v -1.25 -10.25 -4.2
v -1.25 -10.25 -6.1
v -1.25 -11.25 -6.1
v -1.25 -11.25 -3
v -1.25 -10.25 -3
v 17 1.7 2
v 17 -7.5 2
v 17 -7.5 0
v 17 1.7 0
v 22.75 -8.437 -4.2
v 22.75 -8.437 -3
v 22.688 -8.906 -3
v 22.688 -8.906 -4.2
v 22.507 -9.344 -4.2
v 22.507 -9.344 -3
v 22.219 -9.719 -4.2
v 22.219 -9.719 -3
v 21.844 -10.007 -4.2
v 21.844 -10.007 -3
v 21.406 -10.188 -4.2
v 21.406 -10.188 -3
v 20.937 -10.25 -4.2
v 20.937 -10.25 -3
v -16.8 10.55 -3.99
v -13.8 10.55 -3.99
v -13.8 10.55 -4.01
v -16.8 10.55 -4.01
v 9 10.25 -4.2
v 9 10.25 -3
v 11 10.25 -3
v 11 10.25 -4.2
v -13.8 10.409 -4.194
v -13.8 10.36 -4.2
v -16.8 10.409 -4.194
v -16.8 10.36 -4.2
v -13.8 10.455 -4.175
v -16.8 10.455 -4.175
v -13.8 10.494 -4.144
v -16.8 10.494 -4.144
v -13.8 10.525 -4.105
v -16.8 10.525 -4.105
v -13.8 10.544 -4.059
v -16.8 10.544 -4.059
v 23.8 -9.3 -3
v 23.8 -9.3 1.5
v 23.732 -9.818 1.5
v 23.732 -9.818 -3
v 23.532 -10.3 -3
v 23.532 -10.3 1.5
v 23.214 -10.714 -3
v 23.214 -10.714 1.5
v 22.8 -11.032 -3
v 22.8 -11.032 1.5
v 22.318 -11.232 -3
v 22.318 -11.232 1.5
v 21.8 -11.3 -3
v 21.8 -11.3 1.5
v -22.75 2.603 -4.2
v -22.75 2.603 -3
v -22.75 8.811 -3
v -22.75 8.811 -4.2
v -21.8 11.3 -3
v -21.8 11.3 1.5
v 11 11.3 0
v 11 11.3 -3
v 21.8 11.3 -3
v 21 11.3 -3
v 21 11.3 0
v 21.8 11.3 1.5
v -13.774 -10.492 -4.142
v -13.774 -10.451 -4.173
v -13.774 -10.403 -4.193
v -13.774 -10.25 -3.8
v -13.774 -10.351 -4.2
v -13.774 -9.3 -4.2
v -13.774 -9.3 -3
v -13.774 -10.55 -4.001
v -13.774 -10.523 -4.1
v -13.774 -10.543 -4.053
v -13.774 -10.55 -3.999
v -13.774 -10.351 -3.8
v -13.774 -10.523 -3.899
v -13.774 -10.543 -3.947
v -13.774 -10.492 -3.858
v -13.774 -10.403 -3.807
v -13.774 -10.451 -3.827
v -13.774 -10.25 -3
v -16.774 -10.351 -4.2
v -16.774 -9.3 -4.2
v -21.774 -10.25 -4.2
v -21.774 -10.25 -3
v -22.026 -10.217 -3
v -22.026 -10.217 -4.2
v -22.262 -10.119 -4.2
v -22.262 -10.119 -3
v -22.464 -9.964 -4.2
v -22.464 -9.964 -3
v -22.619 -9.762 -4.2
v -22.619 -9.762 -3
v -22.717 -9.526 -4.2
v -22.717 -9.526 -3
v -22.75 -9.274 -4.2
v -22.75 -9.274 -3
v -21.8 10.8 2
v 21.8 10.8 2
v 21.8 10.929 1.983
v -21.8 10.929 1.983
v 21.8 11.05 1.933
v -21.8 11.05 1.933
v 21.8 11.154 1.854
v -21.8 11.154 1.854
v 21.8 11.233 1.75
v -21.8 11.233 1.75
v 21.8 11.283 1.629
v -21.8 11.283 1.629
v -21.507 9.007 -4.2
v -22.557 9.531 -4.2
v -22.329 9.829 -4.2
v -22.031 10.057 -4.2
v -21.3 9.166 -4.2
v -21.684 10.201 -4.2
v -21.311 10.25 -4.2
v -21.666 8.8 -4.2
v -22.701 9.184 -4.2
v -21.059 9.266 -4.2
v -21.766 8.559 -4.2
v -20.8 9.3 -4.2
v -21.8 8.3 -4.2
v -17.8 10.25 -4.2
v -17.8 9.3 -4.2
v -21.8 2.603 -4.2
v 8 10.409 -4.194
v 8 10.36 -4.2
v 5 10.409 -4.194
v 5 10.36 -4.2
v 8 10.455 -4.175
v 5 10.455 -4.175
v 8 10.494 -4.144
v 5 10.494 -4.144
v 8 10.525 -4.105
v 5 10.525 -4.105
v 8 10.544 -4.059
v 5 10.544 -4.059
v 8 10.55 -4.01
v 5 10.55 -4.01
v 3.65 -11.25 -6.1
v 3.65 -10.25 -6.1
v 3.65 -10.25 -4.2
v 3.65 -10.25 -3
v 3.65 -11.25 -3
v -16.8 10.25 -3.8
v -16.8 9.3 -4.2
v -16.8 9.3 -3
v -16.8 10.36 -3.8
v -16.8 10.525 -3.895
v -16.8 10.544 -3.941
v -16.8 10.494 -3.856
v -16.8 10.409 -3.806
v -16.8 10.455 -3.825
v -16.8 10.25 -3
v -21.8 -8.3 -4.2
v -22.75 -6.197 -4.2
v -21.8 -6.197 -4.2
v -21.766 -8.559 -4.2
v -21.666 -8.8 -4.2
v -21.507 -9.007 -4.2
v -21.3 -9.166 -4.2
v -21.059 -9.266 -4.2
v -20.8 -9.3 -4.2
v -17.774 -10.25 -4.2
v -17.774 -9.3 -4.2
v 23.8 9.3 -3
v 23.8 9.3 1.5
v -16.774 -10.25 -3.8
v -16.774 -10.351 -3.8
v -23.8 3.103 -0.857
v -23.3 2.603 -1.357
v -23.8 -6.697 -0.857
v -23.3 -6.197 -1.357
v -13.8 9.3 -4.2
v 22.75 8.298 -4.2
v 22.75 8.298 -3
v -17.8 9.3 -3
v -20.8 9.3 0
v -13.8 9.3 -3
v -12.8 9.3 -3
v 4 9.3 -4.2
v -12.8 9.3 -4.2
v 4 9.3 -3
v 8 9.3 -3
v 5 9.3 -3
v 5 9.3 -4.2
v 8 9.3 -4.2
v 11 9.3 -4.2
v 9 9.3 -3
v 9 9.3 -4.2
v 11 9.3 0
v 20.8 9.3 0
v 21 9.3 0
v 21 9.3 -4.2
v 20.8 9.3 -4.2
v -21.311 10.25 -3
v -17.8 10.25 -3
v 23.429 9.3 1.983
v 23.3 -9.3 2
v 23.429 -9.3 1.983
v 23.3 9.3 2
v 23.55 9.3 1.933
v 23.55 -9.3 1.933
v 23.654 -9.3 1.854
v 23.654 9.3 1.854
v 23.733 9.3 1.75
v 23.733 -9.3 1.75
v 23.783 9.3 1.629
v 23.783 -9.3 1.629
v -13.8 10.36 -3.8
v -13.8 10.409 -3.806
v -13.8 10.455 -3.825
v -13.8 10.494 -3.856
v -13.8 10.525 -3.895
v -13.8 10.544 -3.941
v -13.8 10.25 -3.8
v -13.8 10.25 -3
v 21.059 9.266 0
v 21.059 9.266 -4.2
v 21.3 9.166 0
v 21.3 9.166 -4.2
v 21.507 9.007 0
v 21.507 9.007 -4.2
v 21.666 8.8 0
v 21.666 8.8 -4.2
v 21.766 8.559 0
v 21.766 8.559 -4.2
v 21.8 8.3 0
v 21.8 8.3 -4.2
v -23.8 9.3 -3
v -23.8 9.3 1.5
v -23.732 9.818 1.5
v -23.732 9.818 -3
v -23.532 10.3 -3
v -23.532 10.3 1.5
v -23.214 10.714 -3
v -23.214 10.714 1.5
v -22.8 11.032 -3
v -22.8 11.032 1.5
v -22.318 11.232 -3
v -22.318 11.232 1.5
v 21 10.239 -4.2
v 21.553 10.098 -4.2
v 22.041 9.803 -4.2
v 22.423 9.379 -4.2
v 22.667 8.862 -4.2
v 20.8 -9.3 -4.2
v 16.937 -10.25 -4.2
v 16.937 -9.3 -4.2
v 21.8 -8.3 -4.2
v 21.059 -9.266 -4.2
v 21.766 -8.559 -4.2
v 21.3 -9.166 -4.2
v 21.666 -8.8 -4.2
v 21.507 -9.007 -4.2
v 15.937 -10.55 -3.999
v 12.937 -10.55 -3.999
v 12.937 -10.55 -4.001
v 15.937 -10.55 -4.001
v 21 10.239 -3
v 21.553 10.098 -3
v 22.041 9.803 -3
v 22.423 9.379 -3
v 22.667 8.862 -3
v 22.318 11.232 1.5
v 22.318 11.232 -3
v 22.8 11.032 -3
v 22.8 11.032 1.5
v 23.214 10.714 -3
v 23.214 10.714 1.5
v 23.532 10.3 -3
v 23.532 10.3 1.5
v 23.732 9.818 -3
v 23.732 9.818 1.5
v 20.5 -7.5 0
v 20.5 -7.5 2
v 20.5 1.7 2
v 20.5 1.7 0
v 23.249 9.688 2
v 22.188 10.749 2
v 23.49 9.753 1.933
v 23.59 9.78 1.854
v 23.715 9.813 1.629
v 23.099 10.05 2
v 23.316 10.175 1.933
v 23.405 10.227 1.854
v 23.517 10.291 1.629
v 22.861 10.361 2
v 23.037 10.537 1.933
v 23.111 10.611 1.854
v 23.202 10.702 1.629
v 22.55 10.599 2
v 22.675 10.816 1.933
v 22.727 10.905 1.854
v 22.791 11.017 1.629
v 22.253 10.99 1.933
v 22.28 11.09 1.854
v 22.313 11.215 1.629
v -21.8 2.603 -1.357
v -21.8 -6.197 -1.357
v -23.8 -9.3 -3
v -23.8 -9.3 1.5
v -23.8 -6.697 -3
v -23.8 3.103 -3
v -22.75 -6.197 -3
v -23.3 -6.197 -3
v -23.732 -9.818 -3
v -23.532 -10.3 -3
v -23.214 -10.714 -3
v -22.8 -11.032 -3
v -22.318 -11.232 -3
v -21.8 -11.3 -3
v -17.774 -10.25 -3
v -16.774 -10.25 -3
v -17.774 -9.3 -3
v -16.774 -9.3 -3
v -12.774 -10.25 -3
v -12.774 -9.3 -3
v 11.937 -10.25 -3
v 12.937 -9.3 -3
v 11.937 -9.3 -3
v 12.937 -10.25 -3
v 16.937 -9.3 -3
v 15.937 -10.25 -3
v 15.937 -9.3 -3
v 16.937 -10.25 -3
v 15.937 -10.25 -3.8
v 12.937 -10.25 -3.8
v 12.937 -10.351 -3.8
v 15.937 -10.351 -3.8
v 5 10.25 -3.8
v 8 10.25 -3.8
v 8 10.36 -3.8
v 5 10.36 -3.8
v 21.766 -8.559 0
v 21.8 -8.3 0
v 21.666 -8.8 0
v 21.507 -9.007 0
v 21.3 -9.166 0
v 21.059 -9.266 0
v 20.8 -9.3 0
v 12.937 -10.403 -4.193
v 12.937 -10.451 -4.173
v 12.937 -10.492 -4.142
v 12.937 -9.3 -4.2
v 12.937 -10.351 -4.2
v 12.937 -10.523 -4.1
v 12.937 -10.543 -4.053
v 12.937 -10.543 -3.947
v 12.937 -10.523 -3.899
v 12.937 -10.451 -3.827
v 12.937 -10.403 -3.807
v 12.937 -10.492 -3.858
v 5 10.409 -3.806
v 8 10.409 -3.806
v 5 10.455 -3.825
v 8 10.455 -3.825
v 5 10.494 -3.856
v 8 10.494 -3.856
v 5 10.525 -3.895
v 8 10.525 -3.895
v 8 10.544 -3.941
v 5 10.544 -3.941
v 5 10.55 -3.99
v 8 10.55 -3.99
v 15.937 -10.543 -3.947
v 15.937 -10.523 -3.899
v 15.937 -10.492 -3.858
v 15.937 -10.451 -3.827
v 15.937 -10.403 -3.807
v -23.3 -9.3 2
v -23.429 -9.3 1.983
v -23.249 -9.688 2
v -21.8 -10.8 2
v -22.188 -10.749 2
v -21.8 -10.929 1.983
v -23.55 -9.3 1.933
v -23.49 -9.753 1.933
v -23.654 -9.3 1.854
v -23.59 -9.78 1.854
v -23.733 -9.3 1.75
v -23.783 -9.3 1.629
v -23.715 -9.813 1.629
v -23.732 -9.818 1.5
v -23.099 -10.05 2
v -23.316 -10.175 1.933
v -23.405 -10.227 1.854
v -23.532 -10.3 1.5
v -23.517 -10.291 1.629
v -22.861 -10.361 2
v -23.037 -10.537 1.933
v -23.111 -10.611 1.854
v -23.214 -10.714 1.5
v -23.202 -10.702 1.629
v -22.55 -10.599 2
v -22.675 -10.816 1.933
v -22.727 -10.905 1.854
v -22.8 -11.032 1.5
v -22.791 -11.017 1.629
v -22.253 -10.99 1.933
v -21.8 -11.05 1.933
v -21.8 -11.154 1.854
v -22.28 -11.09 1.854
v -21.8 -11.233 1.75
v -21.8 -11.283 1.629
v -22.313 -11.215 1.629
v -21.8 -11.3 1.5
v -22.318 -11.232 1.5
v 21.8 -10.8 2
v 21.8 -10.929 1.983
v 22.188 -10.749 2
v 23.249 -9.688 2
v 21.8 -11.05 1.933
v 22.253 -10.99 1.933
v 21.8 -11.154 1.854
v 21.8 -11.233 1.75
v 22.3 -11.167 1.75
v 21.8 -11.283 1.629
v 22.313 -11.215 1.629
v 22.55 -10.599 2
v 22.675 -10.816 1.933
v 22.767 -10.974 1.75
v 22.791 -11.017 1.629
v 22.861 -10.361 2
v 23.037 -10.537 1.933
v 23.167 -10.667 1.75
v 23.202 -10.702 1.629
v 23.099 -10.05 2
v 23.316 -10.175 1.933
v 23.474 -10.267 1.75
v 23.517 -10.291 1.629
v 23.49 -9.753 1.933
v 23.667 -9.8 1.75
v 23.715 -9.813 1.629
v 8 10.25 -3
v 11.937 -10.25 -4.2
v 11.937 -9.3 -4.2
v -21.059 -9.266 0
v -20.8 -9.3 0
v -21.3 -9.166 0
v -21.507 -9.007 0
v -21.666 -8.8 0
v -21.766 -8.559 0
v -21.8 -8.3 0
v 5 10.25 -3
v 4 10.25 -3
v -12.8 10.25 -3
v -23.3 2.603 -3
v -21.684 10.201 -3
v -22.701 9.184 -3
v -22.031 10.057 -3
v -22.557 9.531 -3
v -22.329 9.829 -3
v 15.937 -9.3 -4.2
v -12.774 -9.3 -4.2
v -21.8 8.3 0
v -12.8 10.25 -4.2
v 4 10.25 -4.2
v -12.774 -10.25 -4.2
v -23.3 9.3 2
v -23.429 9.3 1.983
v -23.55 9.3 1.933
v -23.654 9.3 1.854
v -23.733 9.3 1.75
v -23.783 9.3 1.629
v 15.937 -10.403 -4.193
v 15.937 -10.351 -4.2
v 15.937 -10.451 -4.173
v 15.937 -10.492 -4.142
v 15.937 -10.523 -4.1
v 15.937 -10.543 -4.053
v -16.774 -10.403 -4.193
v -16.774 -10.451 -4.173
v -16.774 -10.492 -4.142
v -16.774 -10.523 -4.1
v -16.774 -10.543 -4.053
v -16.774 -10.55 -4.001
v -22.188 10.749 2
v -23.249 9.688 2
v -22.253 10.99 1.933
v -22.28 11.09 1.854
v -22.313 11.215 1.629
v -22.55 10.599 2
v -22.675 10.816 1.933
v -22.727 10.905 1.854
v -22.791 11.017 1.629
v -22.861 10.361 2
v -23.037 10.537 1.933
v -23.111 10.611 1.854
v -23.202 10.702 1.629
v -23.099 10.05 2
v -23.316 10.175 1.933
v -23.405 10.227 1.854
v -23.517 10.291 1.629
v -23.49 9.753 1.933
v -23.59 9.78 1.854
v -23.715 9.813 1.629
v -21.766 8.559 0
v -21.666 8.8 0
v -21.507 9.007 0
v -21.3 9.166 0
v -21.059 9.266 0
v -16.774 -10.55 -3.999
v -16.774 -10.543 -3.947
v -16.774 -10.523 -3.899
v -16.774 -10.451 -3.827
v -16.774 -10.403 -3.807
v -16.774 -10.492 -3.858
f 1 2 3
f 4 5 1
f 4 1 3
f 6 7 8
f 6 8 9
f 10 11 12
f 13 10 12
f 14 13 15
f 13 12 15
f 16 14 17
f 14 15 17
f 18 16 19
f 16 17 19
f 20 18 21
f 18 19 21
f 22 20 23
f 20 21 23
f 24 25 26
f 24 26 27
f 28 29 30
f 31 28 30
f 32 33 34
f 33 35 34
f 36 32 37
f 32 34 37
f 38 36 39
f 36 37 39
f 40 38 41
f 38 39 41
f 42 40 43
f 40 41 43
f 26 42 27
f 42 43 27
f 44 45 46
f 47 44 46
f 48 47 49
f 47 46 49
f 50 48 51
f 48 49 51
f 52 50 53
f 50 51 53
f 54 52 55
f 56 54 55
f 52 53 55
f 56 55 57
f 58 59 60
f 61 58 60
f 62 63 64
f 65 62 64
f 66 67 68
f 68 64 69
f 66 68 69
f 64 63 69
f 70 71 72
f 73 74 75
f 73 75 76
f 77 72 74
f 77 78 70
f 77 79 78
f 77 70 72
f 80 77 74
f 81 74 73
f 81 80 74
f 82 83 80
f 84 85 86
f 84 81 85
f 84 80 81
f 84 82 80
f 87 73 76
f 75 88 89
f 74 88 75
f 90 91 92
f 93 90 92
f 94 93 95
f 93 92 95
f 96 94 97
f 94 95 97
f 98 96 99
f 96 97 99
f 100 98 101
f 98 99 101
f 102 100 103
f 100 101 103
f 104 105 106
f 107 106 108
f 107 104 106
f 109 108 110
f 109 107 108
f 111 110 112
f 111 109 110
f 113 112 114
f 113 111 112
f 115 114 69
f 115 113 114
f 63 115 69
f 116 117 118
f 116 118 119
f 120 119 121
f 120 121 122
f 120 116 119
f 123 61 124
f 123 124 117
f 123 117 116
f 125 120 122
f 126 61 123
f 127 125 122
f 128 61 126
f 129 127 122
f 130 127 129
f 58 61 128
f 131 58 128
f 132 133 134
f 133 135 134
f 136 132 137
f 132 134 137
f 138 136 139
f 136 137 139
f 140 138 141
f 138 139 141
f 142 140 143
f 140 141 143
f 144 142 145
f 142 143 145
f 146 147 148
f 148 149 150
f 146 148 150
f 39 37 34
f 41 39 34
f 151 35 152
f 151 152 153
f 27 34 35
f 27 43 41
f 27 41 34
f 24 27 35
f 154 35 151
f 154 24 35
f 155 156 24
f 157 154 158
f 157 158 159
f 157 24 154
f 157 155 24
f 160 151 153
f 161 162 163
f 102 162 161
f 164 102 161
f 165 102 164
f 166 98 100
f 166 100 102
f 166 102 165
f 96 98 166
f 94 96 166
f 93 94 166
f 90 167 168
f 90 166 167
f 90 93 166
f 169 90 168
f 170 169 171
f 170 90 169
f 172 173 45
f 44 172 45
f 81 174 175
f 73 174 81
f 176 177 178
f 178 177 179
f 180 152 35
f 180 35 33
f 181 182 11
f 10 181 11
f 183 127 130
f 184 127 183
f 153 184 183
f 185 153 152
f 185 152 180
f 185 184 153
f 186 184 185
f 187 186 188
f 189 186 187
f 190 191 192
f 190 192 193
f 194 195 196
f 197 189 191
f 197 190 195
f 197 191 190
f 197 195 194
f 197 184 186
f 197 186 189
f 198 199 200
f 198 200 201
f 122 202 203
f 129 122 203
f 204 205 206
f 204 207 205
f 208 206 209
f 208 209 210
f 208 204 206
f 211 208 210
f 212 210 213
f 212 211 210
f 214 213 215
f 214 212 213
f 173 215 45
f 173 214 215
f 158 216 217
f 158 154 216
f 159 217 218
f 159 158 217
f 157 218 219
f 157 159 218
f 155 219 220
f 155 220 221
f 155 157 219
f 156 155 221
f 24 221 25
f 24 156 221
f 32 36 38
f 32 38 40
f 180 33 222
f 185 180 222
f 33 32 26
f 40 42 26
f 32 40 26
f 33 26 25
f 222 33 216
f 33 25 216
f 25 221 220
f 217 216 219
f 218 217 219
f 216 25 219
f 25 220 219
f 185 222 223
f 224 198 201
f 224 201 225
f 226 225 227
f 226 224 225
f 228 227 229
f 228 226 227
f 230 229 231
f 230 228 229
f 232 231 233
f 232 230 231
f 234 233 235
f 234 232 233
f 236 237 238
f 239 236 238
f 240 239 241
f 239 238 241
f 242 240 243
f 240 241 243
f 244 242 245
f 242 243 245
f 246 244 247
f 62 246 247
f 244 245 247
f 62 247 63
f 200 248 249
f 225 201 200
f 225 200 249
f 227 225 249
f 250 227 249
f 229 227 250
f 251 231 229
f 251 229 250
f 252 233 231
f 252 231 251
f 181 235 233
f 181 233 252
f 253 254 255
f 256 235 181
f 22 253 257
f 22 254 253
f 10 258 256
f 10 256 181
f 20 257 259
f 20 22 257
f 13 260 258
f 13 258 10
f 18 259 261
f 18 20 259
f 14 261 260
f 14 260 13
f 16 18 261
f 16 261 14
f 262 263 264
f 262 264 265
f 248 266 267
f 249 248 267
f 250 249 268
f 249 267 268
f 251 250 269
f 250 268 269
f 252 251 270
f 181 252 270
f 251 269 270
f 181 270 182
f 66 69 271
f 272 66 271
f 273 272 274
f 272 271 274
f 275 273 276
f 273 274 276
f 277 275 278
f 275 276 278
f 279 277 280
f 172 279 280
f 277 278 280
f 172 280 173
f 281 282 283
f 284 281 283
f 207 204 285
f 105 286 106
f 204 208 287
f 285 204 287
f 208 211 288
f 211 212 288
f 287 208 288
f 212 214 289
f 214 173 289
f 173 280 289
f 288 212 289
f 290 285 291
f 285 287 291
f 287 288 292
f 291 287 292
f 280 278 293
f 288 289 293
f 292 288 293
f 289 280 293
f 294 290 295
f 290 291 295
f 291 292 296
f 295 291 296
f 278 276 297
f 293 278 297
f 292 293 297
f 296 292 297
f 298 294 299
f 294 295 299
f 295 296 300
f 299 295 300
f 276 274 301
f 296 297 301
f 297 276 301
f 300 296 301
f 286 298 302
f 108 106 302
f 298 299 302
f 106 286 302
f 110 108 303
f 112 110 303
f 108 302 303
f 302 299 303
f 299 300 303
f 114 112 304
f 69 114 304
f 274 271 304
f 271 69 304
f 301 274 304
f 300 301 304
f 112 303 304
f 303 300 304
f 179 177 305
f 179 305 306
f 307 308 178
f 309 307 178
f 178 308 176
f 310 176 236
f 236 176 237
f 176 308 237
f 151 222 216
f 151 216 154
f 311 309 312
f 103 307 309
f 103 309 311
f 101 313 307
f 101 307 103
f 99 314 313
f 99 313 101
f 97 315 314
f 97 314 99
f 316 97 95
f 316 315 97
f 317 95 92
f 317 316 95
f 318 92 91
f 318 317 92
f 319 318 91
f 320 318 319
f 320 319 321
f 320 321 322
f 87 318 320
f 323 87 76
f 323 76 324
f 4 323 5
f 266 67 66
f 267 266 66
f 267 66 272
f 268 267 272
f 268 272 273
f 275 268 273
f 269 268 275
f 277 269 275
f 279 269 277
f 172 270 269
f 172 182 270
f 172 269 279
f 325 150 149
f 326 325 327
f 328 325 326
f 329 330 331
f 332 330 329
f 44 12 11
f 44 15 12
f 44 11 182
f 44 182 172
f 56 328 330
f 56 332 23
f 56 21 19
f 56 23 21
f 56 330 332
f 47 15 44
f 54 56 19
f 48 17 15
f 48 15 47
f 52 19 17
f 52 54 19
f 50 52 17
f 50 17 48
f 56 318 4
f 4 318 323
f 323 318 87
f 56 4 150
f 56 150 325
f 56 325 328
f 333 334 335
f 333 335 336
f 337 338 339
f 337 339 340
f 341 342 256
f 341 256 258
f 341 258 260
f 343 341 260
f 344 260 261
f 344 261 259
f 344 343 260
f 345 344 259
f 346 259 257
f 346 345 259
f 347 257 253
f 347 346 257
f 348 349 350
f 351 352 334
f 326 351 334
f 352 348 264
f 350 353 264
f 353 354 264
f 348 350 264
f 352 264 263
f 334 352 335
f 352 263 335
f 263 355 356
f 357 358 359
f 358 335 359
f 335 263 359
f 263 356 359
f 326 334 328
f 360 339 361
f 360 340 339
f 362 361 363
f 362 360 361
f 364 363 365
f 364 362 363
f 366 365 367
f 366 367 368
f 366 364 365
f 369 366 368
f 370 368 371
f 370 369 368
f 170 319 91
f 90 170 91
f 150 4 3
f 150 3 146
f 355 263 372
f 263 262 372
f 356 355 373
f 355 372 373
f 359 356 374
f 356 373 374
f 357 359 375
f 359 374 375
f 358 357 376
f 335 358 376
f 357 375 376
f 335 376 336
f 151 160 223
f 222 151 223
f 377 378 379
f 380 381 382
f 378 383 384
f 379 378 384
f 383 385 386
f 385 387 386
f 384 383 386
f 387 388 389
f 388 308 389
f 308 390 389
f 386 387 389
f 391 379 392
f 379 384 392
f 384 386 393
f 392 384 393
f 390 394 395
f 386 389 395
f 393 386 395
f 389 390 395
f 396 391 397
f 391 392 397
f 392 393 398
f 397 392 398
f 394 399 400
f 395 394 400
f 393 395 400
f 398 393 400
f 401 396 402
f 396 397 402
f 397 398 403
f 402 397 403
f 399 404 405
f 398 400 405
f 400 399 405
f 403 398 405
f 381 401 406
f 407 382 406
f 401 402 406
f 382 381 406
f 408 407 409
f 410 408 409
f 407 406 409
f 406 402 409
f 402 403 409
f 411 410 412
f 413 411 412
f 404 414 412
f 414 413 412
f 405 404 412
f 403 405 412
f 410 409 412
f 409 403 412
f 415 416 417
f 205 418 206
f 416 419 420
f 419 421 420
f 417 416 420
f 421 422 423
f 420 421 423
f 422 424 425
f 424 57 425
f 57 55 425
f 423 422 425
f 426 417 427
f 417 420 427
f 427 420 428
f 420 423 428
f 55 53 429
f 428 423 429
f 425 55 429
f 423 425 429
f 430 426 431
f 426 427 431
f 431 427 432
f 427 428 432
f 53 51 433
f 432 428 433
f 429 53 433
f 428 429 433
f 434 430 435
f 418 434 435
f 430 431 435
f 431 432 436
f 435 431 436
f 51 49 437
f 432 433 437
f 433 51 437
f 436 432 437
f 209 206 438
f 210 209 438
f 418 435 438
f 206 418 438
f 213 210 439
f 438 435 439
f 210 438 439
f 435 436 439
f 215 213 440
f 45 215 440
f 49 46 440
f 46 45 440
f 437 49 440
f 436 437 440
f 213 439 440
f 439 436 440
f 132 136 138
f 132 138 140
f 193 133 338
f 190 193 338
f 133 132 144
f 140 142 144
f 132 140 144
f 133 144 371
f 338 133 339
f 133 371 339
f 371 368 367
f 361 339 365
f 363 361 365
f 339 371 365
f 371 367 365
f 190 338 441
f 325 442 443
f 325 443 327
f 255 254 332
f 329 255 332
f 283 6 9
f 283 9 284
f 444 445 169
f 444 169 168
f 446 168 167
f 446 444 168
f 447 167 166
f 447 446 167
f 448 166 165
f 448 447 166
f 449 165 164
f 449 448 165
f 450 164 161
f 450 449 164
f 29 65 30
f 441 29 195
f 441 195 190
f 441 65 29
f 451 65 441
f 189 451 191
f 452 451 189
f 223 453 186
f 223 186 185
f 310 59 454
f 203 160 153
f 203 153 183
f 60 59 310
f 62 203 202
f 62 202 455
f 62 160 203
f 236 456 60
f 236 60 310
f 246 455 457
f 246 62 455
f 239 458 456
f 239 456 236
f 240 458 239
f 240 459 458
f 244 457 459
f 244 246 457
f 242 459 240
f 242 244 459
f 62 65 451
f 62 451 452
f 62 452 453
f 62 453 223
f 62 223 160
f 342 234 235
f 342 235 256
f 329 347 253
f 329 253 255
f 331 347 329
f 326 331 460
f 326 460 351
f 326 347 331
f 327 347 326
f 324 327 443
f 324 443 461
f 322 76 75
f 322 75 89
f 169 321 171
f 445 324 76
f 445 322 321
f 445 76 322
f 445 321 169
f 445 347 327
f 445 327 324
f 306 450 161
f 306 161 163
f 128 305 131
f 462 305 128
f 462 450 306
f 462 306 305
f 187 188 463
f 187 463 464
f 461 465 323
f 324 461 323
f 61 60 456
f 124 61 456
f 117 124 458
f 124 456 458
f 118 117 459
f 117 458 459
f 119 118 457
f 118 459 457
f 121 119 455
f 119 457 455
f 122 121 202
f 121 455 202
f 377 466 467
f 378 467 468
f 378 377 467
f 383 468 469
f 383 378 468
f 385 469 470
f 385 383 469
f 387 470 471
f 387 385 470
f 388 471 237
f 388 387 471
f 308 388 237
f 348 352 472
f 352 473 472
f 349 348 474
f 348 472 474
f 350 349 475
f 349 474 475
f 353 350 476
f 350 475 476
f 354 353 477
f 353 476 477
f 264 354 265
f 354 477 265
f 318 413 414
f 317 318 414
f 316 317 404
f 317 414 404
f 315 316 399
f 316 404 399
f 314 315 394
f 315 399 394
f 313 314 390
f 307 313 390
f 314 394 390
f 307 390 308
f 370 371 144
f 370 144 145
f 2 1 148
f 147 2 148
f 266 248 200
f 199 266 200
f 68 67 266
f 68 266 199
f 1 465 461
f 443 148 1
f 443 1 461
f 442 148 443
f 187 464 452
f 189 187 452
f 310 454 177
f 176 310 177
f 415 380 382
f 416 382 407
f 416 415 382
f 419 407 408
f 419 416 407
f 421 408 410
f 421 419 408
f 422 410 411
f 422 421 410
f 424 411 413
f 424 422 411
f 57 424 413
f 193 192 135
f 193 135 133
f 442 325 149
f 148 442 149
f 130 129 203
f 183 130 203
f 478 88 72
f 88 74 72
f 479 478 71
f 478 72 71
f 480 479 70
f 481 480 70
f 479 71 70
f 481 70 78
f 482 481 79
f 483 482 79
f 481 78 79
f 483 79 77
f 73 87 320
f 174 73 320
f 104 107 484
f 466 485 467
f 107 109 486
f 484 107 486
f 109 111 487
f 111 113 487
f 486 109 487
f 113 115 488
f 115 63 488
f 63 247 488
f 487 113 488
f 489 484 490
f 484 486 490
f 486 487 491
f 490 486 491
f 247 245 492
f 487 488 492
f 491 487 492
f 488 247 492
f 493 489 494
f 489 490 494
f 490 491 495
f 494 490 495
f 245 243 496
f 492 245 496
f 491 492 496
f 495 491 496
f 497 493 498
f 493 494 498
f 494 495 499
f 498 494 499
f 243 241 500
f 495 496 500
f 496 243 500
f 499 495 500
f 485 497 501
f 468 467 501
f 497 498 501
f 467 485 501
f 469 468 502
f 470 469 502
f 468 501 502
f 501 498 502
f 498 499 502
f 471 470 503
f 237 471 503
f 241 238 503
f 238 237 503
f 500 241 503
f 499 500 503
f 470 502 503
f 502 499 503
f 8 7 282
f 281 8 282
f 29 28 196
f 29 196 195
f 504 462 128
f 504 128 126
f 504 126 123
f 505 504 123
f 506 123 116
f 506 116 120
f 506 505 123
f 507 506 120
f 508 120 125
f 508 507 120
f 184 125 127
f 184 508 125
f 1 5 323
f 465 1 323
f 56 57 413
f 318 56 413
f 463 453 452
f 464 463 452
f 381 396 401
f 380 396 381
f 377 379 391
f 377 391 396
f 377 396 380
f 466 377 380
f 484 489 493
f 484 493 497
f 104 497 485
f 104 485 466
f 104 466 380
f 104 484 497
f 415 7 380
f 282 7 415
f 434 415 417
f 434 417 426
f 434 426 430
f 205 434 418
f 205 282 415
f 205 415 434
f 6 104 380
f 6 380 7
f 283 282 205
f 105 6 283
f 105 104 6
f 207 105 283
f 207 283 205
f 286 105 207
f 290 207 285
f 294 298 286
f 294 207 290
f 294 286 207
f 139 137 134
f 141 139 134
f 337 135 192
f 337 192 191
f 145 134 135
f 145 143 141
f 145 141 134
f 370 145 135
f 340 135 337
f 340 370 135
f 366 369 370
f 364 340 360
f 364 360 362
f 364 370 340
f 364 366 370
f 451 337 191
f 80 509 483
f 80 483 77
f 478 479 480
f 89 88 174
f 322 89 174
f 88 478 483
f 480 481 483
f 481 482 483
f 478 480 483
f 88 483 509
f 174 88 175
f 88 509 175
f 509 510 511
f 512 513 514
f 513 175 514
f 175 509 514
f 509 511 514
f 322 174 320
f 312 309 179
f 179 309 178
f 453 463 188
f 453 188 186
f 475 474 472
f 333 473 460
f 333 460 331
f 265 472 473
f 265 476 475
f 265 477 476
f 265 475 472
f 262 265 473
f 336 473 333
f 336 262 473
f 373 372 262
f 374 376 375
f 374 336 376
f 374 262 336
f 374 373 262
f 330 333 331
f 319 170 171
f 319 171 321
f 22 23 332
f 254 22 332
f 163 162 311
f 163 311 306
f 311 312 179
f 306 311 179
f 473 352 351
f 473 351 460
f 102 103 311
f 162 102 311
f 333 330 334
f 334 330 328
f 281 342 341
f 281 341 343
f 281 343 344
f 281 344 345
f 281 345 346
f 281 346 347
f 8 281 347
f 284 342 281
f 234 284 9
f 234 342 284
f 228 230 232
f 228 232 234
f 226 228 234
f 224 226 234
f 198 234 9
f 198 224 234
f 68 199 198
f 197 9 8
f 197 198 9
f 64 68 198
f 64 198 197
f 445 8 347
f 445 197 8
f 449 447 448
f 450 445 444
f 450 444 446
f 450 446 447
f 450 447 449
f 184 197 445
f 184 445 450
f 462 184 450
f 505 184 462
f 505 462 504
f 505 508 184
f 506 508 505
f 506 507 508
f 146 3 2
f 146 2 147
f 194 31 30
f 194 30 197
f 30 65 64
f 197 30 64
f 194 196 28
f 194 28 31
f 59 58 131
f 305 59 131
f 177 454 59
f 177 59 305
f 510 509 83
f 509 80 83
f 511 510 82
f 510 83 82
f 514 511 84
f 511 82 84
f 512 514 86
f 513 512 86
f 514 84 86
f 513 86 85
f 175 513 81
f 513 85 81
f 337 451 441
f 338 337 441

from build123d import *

# Parameters (mm, degrees)
PAD_DEPTH       = 2
PAD001_DEPTH    = 3
PAD002_DEPTH    = 1.2
SKETCH004_W     = 8.8
SKETCH004_H     = 3
POCKET_DEPTH    = 2
SKETCH005_W     = 3.5
SKETCH005_H     = 9.2
POCKET001_DEPTH = 2
SKETCH006_W     = 10
SKETCH006_H     = 5
POCKET002_DEPTH = 2
CHAMFER_SIZE    = 0.5
SKETCH007_W     = 3
SKETCH007_H     = 0.4
PAD003_DEPTH    = 0.3
SKETCH008_W     = 1
SKETCH008_H     = 1.2
POCKET003_DEPTH = 1
FILLET_R        = 0.199
SKETCH009_W     = 3
SKETCH009_H     = 0.4
PAD004_DEPTH    = 0.3
FILLET001_R     = 0.19
SKETCH010_W     = 1
SKETCH010_H     = 1.2
POCKET004_DEPTH = 1
FILLET002_R     = 0.5
SKETCH011_W     = 4.9
SKETCH011_H     = 1
PAD005_DEPTH    = 3.1


with BuildPart() as part:
    # Sketch → Pad (new body)
    with BuildSketch(Plane.XY):
        with BuildLine():
            Line((-21.8, -11.3), (21.8, -11.3))
            ThreePointArc((21.8, -11.3), (23.214214, -10.714214), (23.8, -9.3))
            Line((23.8, -9.3), (23.8, 9.3))
            ThreePointArc((23.8, 9.3), (23.214214, 10.714214), (21.8, 11.3))
            Line((21.8, 11.3), (-21.8, 11.3))
            ThreePointArc((-21.8, 11.3), (-23.214214, 10.714214), (-23.8, 9.3))
            Line((-23.8, 9.3), (-23.8, -9.3))
            ThreePointArc((-23.8, -9.3), (-23.214214, -10.714214), (-21.8, -11.3))
        make_face()
    extrude(amount=PAD_DEPTH)

    # Sketch002 (on Face9 of Pad) → Pad001 (join)
    with BuildSketch(Plane(origin=(0, 0, 0), x_dir=(1, 0, 0), z_dir=(0, 0, -1))):
        with BuildLine():
            Line((-23.8, 9.3), (-23.8, -9.3))
            ThreePointArc((-23.8, -9.3), (-23.214214, -10.714214), (-21.8, -11.3))
            Line((-21.8, -11.3), (21.8, -11.3))
            ThreePointArc((21.8, -11.3), (23.214214, -10.714214), (23.8, -9.3))
            Line((23.8, -9.3), (23.8, 9.3))
            ThreePointArc((23.8, 9.3), (23.214214, 10.714214), (21.8, 11.3))
            Line((21.8, 11.3), (-21.8, 11.3))
            ThreePointArc((-21.8, 11.3), (-23.214214, 10.714214), (-23.8, 9.3))
        make_face()
        with BuildLine():
            Line((-21.8, 8.3), (-21.8, -8.3))
            ThreePointArc((-21.8, -8.3), (-21.507107, -9.007107), (-20.8, -9.3))
            Line((-20.8, -9.3), (20.8, -9.3))
            ThreePointArc((20.8, -9.3), (21.507107, -9.007107), (21.8, -8.3))
            Line((21.8, -8.3), (21.8, 8.3))
            ThreePointArc((21.8, 8.3), (21.507107, 9.007107), (20.8, 9.3))
            Line((20.8, 9.3), (-20.8, 9.3))
            ThreePointArc((-20.8, 9.3), (-21.507107, 9.007107), (-21.8, 8.3))
        make_face(mode=Mode.SUBTRACT)
    extrude(amount=PAD001_DEPTH)

    # Sketch003 (on Face1 of Pad001) → Pad002 (join)
    with BuildSketch(Plane(origin=(0, 0, -3), x_dir=(1, 0, 0), z_dir=(0, 0, -1))):
        with BuildLine():
            Line((-22.75, 9.273817), (-22.75, -8.811393))
            ThreePointArc((-22.75, -8.811393), (-22.328642, -9.828642), (-21.311393, -10.25))
            Line((-21.311393, -10.25), (20.79762, -10.25))
            ThreePointArc((20.79762, -10.25), (22.178161, -9.678161), (22.75, -8.29762))
            Line((22.75, -8.29762), (22.75, 8.43735))
            ThreePointArc((22.75, 8.43735), (22.219087, 9.719087), (20.93735, 10.25))
            Line((20.93735, 10.25), (-21.773817, 10.25))
            ThreePointArc((-21.773817, 10.25), (-22.464083, 9.964083), (-22.75, 9.273817))
        make_face()
        with BuildLine():
            Line((-21.8, 8.3), (-21.8, -8.3))
            ThreePointArc((-21.8, -8.3), (-21.507107, -9.007107), (-20.8, -9.3))
            Line((-20.8, -9.3), (20.8, -9.3))
            ThreePointArc((20.8, -9.3), (21.507107, -9.007107), (21.8, -8.3))
            Line((21.8, -8.3), (21.8, 8.3))
            ThreePointArc((21.8, 8.3), (21.507107, 9.007107), (20.8, 9.3))
            Line((20.8, 9.3), (-20.8, 9.3))
            ThreePointArc((-20.8, 9.3), (-21.507107, 9.007107), (-21.8, 8.3))
        make_face(mode=Mode.SUBTRACT)
    extrude(amount=PAD002_DEPTH)

    # Sketch004 (on Face2 of Pad002) → Pocket (cut)
    with BuildSketch(Plane(origin=(-23.8, 0, 0), x_dir=(0, -1, 0), z_dir=(-1, 0, 0))):
        with Locations((1.797054, -2.857067)):
            Rectangle(SKETCH004_W, SKETCH004_H)
    extrude(amount=-POCKET_DEPTH, mode=Mode.SUBTRACT)

    # Sketch005 (on Face21 of Pocket) → Pocket001 (cut)
    with BuildSketch(Plane.XY.offset(2)):
        with Locations((18.75, -2.9)):
            Rectangle(SKETCH005_W, SKETCH005_H)
    extrude(amount=-POCKET001_DEPTH, mode=Mode.SUBTRACT)

    # Sketch006 (on Face15 of Pocket001) → Pocket002 (cut)
    with BuildSketch(Plane(origin=(0, 11.3, 0), x_dir=(-1, 0, 0), z_dir=(0, 1, 0))):
        with Locations((-16, -2.5)):
            Rectangle(SKETCH006_W, SKETCH006_H)
    extrude(amount=-POCKET002_DEPTH, mode=Mode.SUBTRACT)

    # Chamfer
    chamfer_edges = [part.edges().sort_by_distance(p)[0] for p in [
        (-23.8, 2.602946, -2.178533),
        (-23.8, -1.797054, -1.357067),
        (-23.8, -6.197054, -2.178533),
    ]]
    chamfer(chamfer_edges, length=CHAMFER_SIZE)

    # Sketch007 (on Face11 of Chamfer) → Pad003 (join)
    with BuildSketch(Plane.XZ.offset(10.25)):
        with Locations((-15.273817, -4)):
            Rectangle(SKETCH007_W, SKETCH007_H)
        with Locations((14.43735, -4)):
            Rectangle(SKETCH007_W, SKETCH007_H)
    extrude(amount=PAD003_DEPTH)

    # Sketch008 (on Face11 of Pad003) → Pocket003 (cut)
    with BuildSketch(Plane.XZ.offset(10.25)):
        with Locations((-17.273817, -3.6)):
            Rectangle(SKETCH008_W, SKETCH008_H)
        with Locations((-13.273817, -3.6)):
            Rectangle(SKETCH008_W, SKETCH008_H)
        with Locations((16.43735, -3.6)):
            Rectangle(SKETCH008_W, SKETCH008_H)
        with Locations((12.43735, -3.6)):
            Rectangle(SKETCH008_W, SKETCH008_H)
    extrude(amount=-POCKET003_DEPTH, mode=Mode.SUBTRACT)

    # Fillet
    fillet_edges = [part.edges().sort_by_distance(p)[0] for p in [
        (-15.273817, -10.55, -3.8),
        (-15.273817, -10.55, -4.2),
        (14.43735, -10.55, -3.8),
        (14.43735, -10.55, -4.2),
    ]]
    fillet(fillet_edges, radius=FILLET_R)

    # Sketch009 (on Face65 of Fillet) → Pad004 (join)
    with BuildSketch(Plane(origin=(0, 10.25, 0), x_dir=(-1, 0, 0), z_dir=(0, 1, 0))):
        with Locations((15.3, -4)):
            Rectangle(SKETCH009_W, SKETCH009_H)
        with Locations((-6.5, -4)):
            Rectangle(SKETCH009_W, SKETCH009_H)
    extrude(amount=PAD004_DEPTH)

    # Fillet001
    fillet001_edges = [part.edges().sort_by_distance(p)[0] for p in [
        (6.5, 10.55, -3.8),
        (6.5, 10.55, -4.2),
        (-15.3, 10.55, -3.8),
        (-15.3, 10.55, -4.2),
    ]]
    fillet(fillet001_edges, radius=FILLET001_R)

    # Sketch010 (on Face4 of Fillet001) → Pocket004 (cut)
    with BuildSketch(Plane(origin=(0, 10.25, 0), x_dir=(-1, 0, 0), z_dir=(0, 1, 0))):
        with Locations((-8.5, -3.6)):
            Rectangle(SKETCH010_W, SKETCH010_H)
        with Locations((-4.5, -3.6)):
            Rectangle(SKETCH010_W, SKETCH010_H)
        with Locations((13.3, -3.6)):
            Rectangle(SKETCH010_W, SKETCH010_H)
        with Locations((17.3, -3.6)):
            Rectangle(SKETCH010_W, SKETCH010_H)
    extrude(amount=-POCKET004_DEPTH, mode=Mode.SUBTRACT)

    # Fillet002
    fillet002_edges = [part.edges().sort_by_distance(p)[0] for p in [
        (23.8, 0, 2),
        (23.214214, 10.714214, 2),
        (0, 11.3, 2),
        (-23.214214, 10.714214, 2),
        (-23.8, 0, 2),
        (-23.214214, -10.714214, 2),
        (0, -11.3, 2),
        (23.214214, -10.714214, 2),
    ]]
    fillet(fillet002_edges, radius=FILLET002_R)

    # Sketch011 (on Face4 of Fillet002) → Pad005 (join)
    with BuildSketch(Plane(origin=(0, 0, -3), x_dir=(1, 0, 0), z_dir=(0, 0, -1))):
        with Locations((1.2, 10.75)):
            Rectangle(SKETCH011_W, SKETCH011_H)
    extrude(amount=PAD005_DEPTH)


solid = part.part
